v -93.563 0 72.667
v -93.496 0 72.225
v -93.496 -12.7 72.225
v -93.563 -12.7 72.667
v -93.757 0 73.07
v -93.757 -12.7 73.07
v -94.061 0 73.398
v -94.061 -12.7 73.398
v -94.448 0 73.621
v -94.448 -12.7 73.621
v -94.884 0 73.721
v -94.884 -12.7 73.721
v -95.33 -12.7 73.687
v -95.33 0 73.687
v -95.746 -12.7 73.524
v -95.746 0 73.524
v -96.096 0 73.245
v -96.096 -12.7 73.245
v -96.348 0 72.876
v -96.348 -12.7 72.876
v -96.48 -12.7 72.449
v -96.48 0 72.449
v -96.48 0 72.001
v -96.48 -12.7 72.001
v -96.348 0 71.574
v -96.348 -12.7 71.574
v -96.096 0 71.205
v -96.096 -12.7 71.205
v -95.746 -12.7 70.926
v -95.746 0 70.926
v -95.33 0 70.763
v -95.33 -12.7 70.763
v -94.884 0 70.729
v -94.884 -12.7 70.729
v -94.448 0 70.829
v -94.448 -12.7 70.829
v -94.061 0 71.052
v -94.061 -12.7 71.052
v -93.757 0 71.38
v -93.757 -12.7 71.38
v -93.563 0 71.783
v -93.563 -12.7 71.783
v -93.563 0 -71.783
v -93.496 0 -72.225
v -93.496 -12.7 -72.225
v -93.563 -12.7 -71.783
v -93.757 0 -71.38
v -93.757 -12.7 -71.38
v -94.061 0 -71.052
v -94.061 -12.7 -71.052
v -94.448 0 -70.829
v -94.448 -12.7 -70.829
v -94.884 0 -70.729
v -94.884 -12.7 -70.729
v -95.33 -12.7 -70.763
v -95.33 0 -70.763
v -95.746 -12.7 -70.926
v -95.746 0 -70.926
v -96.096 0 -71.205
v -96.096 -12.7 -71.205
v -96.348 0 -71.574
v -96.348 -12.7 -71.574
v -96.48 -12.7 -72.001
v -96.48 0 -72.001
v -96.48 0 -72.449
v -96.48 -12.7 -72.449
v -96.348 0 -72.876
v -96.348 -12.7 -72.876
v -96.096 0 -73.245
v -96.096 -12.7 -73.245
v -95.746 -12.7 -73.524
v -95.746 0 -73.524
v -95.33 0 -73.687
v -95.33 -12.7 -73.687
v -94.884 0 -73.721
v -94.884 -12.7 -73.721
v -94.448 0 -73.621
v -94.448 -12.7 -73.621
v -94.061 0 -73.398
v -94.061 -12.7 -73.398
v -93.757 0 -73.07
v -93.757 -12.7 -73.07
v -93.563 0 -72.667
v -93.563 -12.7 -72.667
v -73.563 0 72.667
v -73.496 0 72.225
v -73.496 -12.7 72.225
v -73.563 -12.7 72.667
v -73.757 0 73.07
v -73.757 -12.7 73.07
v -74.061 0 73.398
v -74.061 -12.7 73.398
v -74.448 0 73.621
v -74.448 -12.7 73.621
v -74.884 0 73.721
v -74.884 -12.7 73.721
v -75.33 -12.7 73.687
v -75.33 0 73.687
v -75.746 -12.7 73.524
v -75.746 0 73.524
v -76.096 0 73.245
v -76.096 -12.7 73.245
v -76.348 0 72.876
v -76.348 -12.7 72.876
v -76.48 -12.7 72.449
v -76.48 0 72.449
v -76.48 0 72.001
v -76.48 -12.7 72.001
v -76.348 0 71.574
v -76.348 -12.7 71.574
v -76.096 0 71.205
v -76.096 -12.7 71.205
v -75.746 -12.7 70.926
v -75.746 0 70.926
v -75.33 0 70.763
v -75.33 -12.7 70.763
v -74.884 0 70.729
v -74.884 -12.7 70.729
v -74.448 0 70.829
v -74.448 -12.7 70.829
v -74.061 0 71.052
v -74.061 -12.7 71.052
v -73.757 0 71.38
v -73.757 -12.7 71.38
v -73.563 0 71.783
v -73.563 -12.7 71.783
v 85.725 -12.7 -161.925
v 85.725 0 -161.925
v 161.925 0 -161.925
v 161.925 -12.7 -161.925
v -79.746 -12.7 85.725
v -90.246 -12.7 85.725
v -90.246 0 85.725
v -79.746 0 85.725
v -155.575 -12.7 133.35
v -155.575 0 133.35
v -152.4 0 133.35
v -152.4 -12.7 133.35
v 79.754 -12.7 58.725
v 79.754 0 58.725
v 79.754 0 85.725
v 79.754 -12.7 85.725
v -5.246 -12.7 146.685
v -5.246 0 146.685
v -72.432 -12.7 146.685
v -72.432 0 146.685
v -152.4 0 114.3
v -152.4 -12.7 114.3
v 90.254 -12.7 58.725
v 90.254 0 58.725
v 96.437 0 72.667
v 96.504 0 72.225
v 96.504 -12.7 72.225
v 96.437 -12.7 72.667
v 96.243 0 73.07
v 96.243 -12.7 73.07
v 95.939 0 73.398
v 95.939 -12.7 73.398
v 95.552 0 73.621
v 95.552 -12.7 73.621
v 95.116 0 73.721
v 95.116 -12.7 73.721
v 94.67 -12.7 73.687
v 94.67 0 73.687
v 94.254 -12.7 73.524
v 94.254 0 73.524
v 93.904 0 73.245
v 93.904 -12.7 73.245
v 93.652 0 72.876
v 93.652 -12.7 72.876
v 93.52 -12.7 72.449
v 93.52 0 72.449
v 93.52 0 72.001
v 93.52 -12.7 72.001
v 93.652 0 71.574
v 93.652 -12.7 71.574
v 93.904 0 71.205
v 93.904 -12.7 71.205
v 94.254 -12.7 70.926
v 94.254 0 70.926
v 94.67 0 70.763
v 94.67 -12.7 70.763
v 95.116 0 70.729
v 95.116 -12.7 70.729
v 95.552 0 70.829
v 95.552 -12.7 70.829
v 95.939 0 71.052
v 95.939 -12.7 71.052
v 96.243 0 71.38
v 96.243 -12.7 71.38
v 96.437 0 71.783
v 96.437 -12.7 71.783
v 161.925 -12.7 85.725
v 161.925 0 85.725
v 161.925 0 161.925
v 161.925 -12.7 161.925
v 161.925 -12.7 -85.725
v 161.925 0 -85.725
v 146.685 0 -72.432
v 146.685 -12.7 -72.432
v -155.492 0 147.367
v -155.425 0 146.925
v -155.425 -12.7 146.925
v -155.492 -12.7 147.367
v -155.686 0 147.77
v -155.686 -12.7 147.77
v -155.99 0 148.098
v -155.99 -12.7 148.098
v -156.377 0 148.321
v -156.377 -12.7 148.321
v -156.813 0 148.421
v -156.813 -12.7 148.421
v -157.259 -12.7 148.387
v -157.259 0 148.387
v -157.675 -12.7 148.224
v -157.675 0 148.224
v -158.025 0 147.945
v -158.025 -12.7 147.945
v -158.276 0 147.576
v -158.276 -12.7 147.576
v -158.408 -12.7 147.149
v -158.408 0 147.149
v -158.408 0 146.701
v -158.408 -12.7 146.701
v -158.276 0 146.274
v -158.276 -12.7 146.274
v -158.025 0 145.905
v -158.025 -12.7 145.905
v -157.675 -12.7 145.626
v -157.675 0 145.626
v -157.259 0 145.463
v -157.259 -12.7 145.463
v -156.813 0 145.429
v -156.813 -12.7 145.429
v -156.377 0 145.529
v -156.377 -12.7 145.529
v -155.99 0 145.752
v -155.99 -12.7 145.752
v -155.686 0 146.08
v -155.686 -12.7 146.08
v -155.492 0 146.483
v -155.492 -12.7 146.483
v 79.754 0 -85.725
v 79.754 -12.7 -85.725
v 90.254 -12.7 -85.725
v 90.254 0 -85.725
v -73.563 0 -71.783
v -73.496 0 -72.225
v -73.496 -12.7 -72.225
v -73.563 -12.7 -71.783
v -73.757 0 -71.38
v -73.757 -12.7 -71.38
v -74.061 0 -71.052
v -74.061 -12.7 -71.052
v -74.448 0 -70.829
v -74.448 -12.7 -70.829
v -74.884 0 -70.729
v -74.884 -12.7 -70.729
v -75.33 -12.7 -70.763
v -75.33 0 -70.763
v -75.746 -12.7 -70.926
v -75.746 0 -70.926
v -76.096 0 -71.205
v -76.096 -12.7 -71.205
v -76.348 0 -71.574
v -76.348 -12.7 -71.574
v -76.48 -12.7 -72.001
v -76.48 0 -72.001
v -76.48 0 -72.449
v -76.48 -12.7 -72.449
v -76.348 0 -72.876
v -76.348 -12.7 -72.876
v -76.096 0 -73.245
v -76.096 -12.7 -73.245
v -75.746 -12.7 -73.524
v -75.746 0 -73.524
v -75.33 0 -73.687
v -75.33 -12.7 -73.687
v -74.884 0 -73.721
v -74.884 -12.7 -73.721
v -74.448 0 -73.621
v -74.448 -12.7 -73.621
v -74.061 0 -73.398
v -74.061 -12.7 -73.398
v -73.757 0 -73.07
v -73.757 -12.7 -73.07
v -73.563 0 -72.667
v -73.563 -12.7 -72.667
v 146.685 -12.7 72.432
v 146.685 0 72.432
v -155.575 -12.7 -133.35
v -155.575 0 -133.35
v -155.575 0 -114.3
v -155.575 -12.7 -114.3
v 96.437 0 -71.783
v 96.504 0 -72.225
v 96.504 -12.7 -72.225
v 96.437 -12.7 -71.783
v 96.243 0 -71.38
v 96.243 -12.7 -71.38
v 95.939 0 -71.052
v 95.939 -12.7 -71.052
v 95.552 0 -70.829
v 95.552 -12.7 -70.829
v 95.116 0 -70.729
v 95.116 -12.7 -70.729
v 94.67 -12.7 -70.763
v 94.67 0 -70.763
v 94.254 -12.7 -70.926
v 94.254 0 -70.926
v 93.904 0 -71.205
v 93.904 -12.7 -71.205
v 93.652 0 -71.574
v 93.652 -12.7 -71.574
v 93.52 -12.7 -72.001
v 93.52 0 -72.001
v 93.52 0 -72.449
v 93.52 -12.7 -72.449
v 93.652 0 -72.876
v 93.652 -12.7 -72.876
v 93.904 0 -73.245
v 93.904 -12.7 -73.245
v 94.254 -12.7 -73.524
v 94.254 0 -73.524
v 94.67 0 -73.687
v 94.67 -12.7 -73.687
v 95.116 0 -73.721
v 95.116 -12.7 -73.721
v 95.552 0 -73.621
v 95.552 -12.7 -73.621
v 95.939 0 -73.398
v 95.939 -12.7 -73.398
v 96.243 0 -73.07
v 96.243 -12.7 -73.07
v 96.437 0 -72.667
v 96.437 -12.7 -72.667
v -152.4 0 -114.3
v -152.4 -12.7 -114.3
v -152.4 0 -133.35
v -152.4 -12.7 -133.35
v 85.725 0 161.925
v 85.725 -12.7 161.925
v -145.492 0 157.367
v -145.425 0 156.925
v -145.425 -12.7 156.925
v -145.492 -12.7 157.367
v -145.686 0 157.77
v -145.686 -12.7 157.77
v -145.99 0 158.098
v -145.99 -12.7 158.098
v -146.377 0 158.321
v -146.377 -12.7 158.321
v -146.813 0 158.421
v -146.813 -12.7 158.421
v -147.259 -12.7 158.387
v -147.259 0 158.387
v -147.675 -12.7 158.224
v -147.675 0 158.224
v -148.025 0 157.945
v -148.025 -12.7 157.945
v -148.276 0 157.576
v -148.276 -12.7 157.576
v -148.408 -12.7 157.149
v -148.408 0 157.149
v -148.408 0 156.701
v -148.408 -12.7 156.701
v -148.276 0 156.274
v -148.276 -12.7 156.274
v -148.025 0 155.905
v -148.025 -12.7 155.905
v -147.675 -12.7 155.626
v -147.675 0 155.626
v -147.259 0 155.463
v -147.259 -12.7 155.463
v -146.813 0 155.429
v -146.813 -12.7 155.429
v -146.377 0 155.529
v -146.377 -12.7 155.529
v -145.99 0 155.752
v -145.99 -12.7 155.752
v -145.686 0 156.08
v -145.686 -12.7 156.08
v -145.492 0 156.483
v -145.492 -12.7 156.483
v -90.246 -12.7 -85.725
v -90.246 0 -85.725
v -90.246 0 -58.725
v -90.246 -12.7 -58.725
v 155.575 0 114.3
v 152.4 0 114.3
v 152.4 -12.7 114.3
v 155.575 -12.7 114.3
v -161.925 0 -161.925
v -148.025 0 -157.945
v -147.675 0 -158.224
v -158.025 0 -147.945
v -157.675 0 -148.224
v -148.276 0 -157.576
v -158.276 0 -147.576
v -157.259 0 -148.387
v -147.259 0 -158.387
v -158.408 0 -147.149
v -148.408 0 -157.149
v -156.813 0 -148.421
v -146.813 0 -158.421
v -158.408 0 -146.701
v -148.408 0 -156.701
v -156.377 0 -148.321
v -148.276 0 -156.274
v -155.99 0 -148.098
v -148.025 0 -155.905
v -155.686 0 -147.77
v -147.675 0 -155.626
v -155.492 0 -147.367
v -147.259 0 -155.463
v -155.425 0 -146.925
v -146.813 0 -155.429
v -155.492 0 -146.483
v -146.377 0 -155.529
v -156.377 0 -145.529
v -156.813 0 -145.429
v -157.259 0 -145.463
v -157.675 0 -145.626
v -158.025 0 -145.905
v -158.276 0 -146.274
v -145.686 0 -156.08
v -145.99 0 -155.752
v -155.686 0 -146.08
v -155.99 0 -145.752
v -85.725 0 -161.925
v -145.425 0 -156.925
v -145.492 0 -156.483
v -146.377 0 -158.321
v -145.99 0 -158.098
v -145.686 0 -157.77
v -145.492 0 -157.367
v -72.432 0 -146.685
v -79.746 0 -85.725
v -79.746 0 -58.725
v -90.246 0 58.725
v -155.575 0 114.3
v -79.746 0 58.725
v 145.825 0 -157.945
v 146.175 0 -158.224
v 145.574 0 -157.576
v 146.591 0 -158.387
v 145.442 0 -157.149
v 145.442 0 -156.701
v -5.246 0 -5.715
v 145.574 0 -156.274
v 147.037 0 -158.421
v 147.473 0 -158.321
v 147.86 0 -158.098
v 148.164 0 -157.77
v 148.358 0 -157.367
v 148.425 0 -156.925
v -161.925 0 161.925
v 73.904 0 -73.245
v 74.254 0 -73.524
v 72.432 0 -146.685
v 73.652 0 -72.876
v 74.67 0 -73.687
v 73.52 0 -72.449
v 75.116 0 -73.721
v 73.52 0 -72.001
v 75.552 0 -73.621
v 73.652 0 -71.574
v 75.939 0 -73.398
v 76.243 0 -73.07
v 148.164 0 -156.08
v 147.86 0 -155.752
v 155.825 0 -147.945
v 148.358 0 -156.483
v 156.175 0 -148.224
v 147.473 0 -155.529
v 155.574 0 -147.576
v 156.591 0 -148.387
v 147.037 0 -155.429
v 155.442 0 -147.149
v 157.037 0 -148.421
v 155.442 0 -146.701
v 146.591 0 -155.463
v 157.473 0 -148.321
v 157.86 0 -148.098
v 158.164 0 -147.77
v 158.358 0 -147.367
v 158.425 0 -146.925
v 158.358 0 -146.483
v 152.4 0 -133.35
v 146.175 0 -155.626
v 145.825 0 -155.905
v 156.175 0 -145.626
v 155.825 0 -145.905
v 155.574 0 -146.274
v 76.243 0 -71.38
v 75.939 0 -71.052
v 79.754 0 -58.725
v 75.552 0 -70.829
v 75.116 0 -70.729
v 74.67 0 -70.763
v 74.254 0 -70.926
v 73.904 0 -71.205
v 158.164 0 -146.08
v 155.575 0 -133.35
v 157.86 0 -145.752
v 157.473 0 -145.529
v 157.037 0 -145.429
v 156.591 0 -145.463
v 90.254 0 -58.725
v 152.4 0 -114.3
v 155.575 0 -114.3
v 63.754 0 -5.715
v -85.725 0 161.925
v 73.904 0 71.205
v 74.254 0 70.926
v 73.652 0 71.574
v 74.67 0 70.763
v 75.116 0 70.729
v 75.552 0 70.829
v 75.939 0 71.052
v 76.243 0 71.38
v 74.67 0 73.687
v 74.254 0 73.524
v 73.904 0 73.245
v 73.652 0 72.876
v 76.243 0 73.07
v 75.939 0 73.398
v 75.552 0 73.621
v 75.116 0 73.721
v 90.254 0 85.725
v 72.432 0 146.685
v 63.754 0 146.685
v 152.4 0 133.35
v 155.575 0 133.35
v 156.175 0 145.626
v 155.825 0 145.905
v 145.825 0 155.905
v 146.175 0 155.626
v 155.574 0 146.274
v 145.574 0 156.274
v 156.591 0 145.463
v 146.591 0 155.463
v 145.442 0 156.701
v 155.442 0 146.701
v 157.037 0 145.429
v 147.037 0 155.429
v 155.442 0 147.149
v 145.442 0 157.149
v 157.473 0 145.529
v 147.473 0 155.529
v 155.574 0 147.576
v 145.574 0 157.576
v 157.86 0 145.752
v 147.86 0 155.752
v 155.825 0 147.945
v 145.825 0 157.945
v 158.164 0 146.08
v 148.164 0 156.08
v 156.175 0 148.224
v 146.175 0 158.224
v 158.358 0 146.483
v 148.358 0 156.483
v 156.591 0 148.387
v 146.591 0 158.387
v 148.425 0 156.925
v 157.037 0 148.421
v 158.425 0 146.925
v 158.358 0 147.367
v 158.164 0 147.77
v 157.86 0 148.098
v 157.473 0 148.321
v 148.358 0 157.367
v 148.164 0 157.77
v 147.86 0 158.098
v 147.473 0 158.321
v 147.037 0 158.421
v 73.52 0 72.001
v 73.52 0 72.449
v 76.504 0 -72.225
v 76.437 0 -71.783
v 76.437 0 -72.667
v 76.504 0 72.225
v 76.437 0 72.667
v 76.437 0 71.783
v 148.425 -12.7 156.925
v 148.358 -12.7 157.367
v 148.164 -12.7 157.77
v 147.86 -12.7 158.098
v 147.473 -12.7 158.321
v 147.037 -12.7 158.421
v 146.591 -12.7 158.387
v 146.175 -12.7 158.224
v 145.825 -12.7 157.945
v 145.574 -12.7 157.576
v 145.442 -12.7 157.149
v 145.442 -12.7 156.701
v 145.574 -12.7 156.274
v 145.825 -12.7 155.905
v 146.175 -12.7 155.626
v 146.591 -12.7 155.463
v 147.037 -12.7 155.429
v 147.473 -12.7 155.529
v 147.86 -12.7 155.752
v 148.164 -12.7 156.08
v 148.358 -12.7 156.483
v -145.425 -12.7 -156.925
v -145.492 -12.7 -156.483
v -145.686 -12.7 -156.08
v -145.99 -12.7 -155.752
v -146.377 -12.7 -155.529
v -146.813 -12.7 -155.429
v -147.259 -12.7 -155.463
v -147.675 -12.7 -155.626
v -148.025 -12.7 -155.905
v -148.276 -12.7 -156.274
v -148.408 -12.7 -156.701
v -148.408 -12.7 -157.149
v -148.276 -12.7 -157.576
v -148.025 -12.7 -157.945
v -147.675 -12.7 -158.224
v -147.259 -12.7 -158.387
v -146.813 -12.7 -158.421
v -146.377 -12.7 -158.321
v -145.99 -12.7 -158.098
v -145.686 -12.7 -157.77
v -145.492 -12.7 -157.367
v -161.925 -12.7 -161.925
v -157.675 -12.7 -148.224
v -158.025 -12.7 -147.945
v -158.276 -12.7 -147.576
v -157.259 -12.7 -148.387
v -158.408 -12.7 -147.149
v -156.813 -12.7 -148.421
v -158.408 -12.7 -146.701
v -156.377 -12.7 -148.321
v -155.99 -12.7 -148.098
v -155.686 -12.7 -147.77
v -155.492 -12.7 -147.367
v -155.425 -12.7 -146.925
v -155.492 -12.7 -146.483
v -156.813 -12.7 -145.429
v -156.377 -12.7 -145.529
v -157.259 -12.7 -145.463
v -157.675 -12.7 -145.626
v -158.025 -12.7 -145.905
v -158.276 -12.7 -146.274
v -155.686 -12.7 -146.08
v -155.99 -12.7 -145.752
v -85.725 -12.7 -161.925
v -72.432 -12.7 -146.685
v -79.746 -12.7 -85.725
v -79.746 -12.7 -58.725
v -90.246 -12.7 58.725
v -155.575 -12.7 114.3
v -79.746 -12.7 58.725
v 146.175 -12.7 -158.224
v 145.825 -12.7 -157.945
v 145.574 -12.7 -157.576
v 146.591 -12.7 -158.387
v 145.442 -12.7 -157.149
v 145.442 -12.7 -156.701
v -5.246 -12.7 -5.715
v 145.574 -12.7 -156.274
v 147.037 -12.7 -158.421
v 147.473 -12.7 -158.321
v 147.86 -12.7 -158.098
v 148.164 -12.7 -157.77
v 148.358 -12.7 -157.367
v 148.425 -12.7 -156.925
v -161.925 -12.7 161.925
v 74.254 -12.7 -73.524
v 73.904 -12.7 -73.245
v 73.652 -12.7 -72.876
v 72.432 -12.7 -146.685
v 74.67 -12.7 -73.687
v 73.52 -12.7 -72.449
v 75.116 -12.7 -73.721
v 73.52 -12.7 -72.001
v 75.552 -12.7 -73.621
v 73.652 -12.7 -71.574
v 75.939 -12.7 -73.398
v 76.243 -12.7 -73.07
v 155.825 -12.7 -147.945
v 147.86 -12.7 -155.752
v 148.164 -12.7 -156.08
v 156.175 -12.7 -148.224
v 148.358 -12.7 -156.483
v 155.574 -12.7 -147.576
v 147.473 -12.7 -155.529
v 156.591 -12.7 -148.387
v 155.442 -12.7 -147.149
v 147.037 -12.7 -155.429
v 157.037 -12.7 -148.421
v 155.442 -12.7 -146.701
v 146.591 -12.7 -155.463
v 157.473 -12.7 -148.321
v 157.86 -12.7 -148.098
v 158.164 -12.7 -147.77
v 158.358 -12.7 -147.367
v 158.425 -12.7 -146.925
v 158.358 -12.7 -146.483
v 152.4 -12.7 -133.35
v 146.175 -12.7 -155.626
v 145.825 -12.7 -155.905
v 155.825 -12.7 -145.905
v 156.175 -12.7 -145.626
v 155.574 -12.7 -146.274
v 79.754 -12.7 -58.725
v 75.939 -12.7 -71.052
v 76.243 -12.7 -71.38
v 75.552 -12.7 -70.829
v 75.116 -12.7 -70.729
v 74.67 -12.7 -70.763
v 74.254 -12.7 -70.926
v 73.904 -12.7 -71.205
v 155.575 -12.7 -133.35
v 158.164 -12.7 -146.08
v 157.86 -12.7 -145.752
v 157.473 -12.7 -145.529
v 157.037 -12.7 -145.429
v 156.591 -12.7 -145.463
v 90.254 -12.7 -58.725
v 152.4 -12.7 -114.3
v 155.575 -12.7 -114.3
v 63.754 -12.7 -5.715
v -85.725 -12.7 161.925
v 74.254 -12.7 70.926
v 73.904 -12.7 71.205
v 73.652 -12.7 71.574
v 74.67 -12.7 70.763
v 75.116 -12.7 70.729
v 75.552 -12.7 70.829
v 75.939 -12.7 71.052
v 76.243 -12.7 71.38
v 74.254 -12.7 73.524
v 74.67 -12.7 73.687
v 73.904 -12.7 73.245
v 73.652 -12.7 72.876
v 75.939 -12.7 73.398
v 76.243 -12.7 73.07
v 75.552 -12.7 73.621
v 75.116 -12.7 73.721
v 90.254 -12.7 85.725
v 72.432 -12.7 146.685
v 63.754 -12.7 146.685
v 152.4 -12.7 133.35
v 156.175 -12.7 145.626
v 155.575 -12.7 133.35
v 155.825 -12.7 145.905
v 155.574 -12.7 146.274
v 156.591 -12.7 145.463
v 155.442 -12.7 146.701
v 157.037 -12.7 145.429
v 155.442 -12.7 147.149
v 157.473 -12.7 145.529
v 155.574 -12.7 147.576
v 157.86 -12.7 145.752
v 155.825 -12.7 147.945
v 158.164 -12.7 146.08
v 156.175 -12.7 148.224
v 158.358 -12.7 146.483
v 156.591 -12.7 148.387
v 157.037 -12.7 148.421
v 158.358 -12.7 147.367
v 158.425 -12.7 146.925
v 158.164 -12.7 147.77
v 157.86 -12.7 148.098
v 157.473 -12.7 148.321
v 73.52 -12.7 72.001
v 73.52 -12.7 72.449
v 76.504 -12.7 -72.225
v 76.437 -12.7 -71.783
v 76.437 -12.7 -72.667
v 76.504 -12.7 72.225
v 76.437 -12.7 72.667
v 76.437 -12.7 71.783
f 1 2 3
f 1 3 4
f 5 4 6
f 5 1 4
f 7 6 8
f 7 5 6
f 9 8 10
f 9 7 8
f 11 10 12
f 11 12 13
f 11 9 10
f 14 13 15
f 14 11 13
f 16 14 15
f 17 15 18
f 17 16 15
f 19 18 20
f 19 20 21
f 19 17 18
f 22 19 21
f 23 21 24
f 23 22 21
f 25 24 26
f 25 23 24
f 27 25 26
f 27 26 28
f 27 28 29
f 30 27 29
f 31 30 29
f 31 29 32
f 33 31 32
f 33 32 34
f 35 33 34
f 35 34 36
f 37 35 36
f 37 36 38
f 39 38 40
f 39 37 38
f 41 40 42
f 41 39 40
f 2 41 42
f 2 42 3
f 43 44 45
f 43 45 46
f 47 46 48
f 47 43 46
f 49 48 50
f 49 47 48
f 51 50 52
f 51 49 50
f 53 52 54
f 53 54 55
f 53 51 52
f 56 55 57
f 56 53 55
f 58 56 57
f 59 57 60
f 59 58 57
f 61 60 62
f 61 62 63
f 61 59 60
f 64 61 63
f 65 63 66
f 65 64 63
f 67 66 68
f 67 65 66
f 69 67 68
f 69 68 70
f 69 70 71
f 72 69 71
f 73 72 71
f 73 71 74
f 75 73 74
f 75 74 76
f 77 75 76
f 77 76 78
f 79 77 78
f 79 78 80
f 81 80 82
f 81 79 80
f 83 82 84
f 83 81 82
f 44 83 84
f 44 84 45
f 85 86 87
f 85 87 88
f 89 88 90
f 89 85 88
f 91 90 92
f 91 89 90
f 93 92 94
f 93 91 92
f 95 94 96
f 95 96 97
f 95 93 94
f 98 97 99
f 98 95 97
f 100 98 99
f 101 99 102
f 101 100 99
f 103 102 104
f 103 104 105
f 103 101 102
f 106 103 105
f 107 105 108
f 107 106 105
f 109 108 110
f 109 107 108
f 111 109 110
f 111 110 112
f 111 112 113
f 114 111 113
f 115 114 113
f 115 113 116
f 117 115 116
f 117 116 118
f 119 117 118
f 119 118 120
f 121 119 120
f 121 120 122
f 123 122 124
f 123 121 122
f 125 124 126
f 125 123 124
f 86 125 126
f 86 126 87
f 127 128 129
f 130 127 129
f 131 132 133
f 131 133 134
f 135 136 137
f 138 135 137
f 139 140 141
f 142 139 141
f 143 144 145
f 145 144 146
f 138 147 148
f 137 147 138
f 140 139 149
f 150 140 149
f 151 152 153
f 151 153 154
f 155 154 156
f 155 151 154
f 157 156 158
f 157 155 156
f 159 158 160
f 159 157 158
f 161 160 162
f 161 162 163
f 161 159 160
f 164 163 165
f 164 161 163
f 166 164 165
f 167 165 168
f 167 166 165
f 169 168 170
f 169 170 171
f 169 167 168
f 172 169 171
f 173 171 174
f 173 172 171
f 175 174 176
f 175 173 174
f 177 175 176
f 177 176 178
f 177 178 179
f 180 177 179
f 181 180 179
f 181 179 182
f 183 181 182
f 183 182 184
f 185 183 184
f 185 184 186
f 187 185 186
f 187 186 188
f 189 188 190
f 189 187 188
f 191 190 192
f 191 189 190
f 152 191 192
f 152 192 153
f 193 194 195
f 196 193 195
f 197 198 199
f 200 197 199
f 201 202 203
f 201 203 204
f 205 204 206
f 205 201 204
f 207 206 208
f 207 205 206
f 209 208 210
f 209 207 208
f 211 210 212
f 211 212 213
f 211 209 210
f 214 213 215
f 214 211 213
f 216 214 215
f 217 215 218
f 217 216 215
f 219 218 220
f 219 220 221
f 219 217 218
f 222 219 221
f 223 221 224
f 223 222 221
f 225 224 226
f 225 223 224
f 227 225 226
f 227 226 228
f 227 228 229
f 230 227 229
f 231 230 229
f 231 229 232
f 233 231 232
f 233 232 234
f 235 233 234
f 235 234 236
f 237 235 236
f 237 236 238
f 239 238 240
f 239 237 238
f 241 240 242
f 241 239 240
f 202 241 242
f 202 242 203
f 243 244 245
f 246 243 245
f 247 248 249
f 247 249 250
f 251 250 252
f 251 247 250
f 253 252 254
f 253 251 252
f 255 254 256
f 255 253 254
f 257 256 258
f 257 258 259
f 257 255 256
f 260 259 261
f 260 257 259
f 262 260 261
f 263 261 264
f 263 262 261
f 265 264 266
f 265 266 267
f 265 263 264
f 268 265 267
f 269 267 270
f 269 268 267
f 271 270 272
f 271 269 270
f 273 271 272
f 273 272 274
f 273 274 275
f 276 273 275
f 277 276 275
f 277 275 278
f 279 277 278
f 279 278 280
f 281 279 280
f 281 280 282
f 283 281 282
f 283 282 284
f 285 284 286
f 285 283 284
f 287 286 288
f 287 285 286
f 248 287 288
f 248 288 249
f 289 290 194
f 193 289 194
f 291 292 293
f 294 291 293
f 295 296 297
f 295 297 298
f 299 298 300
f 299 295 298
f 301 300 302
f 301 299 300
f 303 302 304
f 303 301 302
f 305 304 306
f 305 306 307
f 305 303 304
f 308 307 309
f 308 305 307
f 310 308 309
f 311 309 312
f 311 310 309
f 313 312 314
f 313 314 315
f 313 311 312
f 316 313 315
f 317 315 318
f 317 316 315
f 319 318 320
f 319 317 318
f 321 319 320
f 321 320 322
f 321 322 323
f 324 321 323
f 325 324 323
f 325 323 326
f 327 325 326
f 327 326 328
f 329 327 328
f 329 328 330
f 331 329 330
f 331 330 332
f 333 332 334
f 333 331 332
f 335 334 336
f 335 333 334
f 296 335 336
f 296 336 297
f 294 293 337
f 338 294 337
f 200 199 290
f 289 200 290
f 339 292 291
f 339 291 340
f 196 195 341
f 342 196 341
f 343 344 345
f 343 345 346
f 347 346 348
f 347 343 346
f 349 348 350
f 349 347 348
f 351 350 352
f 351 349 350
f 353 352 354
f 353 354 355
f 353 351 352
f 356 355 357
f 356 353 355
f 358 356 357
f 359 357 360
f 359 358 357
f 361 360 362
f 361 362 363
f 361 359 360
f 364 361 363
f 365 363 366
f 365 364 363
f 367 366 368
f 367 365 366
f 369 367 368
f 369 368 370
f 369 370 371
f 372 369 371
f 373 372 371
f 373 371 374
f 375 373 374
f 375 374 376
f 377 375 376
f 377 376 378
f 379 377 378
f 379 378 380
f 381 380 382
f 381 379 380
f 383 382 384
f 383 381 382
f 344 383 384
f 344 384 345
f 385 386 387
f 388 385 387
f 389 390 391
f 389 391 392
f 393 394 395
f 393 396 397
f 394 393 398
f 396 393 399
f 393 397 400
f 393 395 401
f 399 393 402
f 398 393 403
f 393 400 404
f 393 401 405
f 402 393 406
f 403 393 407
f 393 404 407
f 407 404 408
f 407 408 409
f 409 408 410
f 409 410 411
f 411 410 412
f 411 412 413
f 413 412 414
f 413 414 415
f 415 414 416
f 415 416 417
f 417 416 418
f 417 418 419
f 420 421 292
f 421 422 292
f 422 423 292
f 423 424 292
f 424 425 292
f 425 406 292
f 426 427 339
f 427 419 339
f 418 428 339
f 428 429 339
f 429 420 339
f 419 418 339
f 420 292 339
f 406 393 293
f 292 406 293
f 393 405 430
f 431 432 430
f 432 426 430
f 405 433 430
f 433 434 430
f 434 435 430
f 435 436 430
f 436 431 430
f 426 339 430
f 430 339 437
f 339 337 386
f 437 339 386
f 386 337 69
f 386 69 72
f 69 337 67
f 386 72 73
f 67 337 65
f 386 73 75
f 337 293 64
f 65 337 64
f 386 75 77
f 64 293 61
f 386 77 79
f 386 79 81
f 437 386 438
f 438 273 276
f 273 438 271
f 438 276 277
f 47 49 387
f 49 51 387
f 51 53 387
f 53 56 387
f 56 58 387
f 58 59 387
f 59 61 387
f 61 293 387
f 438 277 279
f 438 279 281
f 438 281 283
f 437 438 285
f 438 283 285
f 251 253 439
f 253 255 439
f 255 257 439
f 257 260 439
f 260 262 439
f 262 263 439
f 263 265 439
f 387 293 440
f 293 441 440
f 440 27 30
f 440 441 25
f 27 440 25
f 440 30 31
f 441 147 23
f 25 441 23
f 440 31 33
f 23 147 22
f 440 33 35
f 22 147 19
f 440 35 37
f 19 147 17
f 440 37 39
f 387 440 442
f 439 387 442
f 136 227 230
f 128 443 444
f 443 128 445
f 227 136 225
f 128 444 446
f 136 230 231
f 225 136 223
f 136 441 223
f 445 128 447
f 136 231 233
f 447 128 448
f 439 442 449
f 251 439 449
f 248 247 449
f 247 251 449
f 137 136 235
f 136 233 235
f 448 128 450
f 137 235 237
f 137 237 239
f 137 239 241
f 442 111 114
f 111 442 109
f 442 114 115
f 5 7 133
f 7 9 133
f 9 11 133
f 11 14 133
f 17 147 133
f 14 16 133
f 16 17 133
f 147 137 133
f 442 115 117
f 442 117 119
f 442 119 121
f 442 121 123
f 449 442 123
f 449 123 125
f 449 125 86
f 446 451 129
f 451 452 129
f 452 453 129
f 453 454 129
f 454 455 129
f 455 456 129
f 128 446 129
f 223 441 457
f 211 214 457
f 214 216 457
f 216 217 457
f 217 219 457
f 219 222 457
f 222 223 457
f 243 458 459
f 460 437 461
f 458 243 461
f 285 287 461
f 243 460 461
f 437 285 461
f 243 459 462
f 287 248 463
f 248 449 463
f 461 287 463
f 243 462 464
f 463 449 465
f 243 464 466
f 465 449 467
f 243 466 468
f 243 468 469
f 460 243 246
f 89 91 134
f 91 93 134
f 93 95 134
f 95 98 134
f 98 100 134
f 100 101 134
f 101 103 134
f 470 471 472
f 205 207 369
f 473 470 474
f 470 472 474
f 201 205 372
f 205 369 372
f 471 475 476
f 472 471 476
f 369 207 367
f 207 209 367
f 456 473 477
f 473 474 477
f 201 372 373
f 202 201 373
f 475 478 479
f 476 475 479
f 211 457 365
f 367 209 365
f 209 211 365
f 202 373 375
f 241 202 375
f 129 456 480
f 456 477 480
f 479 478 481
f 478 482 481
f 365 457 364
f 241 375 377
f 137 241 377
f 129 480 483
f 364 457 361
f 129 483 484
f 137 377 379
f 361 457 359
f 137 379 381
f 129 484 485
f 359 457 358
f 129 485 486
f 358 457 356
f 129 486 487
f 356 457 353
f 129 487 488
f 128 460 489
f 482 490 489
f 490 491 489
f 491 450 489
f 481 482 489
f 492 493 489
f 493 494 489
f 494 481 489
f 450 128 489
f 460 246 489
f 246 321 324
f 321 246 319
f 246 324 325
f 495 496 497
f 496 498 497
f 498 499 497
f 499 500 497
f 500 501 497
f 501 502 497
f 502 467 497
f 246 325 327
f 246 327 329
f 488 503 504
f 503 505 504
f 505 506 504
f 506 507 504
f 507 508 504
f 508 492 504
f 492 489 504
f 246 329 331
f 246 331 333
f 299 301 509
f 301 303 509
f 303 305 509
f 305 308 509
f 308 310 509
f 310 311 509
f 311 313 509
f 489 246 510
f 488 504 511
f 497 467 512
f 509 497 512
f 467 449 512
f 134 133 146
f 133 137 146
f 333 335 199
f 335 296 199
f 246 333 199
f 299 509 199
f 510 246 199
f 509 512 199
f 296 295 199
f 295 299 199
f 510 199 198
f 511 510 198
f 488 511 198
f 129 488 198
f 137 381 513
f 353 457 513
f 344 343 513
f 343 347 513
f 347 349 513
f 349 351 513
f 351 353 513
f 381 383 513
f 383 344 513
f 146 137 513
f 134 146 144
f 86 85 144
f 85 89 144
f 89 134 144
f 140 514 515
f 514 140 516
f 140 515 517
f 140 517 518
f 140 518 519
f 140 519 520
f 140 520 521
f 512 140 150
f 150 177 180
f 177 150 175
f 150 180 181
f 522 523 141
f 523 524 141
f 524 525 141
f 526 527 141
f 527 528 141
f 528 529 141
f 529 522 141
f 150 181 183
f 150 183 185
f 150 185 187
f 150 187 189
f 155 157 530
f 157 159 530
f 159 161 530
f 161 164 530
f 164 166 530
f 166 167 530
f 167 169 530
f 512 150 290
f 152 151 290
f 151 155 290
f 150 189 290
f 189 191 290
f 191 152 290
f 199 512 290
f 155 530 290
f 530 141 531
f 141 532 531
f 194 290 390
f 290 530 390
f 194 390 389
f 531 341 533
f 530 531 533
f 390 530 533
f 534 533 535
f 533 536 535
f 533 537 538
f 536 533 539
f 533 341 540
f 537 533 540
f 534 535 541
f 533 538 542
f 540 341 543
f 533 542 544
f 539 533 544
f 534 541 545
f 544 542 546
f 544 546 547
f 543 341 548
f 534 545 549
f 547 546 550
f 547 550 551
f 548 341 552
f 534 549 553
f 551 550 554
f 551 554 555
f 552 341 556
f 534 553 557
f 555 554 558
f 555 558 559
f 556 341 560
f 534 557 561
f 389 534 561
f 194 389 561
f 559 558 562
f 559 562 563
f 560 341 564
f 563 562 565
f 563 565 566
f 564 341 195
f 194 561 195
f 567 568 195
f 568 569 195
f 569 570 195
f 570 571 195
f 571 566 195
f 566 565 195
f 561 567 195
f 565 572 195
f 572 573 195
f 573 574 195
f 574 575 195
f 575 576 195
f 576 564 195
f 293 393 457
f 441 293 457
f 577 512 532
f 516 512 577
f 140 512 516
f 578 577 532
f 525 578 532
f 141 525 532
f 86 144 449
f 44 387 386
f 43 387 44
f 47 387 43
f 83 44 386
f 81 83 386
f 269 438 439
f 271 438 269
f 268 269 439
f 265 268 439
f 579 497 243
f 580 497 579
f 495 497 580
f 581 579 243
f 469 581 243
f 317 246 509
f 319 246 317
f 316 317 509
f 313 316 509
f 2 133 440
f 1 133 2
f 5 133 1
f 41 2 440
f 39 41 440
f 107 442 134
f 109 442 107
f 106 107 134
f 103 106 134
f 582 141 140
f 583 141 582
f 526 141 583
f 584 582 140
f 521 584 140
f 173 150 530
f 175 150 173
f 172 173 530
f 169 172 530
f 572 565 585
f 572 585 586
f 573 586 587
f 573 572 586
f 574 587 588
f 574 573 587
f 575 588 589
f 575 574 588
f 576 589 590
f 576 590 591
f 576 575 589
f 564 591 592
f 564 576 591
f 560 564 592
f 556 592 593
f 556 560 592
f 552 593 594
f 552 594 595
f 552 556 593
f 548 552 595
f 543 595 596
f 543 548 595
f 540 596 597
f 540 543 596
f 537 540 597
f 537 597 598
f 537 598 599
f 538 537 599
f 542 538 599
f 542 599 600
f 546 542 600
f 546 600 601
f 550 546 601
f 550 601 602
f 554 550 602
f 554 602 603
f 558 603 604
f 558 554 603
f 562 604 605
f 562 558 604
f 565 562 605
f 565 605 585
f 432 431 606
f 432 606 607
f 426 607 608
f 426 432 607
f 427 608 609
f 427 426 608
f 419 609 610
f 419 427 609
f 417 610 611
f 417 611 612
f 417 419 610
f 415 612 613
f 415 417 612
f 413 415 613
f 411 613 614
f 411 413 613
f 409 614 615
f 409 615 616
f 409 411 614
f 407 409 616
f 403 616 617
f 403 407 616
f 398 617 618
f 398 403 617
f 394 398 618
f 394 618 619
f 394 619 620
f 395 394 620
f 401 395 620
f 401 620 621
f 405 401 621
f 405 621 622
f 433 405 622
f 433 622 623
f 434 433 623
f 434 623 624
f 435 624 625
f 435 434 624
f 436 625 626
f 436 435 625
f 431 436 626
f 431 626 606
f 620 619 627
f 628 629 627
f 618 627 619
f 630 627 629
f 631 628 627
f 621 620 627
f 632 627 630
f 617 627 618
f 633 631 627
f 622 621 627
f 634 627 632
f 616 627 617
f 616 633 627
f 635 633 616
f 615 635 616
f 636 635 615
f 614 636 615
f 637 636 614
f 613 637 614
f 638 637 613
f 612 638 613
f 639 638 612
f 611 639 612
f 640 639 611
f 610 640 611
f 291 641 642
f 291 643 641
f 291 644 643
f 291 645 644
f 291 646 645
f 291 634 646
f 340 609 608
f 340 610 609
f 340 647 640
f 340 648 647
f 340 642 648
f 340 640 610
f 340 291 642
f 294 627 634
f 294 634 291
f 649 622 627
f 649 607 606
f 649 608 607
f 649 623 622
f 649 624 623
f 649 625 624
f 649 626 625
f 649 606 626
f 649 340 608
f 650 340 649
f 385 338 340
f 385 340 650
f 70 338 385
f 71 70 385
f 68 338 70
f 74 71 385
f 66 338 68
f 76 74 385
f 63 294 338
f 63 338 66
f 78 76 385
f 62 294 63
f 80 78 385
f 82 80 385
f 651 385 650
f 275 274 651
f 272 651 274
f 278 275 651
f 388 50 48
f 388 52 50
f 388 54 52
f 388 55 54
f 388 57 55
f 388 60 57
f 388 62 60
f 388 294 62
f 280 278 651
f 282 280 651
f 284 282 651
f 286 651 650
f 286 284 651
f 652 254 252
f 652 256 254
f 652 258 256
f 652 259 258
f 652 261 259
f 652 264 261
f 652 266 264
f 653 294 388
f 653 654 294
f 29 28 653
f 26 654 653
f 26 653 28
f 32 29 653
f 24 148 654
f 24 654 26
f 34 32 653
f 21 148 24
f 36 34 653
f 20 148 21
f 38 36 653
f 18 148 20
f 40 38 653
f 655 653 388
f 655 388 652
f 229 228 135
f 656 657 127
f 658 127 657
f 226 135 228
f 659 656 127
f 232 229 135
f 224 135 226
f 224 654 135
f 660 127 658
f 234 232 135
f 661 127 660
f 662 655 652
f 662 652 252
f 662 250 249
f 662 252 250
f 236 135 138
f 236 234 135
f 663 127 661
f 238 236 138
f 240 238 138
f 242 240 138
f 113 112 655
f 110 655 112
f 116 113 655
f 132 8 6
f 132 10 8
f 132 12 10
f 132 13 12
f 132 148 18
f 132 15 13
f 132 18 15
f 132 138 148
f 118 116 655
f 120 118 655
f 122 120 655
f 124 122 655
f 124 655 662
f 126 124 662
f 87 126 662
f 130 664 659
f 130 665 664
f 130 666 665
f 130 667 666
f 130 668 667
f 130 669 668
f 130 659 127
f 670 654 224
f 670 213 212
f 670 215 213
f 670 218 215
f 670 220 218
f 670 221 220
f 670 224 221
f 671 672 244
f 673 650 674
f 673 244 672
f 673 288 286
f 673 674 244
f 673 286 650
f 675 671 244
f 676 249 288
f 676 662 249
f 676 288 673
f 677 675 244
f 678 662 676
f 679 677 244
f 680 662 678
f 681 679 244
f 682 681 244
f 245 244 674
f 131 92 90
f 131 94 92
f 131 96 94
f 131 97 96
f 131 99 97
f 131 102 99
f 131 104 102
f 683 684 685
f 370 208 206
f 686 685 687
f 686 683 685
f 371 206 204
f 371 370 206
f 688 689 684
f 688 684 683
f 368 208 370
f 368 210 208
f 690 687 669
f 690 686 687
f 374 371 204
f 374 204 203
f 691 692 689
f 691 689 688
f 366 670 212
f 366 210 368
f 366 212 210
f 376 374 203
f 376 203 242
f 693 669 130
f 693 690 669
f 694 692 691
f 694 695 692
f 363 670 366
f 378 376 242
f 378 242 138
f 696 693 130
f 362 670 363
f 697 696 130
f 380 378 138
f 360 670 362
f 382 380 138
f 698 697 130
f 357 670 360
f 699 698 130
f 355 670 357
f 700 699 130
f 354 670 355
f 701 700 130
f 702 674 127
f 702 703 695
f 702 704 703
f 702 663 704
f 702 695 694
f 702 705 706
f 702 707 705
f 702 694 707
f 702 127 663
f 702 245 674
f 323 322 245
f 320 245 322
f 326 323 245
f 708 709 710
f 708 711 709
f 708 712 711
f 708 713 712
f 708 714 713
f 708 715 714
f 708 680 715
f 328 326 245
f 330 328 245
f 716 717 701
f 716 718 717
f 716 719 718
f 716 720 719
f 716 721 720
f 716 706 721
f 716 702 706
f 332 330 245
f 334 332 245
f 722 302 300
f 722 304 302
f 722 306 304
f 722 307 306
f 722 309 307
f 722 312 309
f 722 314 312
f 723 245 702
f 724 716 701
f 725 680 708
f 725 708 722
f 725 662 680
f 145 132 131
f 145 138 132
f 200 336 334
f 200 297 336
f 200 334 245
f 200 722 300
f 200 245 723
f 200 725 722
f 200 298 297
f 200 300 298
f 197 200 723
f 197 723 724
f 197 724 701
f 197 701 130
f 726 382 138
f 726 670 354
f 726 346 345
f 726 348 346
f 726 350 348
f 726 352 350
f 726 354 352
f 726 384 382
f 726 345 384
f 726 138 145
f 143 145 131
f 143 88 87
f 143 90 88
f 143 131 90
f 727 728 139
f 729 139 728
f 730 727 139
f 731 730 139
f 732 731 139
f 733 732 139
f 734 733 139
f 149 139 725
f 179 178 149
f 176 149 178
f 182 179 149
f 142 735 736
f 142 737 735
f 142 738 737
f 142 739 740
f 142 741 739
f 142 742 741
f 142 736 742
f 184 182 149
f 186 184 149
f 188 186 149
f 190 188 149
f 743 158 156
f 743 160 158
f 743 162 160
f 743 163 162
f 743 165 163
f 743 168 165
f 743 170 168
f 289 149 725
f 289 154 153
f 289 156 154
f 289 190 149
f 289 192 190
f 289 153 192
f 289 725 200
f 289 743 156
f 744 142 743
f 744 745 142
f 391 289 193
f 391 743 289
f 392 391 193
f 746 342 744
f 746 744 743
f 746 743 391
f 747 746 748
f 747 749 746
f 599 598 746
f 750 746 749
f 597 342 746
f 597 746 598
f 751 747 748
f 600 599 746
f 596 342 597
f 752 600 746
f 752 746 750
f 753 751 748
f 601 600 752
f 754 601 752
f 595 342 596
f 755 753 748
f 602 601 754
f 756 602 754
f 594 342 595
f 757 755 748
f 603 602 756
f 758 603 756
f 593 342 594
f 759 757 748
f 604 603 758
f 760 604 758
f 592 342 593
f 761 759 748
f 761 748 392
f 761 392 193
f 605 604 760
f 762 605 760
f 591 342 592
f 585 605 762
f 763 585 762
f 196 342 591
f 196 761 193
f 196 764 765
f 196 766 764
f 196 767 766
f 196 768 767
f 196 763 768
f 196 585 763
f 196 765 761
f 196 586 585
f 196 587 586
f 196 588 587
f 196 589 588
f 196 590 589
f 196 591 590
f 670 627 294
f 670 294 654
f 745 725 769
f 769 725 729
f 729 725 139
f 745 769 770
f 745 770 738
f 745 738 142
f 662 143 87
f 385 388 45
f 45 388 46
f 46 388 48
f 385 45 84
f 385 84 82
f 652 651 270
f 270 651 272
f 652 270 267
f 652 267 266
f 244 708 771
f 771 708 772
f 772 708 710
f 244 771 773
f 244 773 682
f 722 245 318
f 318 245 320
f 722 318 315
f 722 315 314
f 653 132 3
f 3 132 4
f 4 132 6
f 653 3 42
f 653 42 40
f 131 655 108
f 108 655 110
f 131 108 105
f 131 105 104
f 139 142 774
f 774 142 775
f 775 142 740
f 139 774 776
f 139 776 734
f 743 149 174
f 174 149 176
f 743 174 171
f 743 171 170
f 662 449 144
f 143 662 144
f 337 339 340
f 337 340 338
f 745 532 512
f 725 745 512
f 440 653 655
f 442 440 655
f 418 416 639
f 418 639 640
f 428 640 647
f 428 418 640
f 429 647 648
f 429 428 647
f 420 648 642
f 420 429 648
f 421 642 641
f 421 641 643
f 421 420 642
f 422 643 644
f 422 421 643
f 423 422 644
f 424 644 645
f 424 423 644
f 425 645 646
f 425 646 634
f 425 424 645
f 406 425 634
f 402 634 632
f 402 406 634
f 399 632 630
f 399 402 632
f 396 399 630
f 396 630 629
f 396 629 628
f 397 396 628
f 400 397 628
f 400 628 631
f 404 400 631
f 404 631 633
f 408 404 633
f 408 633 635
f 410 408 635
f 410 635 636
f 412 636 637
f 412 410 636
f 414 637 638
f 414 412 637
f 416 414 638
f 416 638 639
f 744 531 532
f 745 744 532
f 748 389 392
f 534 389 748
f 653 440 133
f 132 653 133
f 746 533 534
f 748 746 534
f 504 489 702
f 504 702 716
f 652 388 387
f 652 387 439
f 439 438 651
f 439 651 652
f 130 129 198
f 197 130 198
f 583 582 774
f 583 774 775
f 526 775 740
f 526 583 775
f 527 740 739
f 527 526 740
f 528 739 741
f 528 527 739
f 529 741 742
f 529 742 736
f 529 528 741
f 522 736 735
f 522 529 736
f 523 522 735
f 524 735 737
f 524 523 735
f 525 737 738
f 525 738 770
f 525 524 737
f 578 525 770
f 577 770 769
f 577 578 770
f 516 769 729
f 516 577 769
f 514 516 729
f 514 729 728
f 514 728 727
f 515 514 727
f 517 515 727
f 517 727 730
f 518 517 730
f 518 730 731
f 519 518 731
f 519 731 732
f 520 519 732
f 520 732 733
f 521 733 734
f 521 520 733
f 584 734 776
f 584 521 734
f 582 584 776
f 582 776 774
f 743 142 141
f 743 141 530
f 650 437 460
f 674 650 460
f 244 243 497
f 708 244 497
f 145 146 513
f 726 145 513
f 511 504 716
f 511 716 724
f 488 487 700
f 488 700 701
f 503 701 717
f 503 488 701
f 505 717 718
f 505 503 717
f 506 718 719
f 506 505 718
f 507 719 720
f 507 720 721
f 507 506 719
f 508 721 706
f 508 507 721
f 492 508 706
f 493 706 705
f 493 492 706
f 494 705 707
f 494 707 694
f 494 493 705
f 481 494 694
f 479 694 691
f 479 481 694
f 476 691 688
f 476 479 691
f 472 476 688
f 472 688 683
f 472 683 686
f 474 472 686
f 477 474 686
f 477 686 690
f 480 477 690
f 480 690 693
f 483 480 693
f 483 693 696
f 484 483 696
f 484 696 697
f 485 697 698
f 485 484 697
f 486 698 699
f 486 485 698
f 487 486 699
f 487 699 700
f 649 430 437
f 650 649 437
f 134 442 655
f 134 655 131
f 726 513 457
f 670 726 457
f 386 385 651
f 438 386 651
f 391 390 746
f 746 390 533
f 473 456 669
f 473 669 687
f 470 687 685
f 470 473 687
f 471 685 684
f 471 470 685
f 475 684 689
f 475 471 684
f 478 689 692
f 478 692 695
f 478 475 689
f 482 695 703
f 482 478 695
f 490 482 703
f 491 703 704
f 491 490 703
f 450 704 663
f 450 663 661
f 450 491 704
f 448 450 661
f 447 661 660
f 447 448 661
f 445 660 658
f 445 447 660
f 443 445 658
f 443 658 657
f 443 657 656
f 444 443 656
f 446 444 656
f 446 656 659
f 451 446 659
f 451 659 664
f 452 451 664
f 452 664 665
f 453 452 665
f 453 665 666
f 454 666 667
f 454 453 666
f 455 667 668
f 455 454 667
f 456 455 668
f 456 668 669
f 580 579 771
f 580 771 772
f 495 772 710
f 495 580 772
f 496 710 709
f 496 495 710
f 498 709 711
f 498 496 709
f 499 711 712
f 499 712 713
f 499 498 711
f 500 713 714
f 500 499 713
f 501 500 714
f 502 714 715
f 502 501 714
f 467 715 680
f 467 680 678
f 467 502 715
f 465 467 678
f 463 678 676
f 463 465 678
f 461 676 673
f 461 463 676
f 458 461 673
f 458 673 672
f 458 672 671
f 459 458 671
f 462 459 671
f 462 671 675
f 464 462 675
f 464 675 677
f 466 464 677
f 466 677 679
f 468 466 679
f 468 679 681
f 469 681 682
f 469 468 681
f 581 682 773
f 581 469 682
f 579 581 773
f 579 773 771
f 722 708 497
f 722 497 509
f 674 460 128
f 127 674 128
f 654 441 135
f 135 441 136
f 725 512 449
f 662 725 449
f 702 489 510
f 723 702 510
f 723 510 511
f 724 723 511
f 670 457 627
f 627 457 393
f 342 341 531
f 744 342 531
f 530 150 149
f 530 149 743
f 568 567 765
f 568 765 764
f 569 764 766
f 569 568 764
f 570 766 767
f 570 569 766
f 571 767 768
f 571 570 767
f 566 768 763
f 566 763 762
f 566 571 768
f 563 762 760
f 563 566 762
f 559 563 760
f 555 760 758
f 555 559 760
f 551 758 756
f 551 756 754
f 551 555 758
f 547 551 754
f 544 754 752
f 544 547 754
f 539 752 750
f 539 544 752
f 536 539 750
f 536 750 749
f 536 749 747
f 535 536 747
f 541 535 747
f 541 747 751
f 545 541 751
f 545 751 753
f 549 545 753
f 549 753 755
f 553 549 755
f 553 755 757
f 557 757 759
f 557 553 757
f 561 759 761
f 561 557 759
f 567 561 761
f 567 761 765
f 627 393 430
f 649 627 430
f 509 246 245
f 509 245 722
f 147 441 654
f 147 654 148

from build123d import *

# Parameters (mm, degrees)
F0_R     = 1.5
F0_W     = 3.175
F0_H     = 19.05
F0_W_2   = 10.5
F0_H_2   = 27
F1_DEPTH = 12.7


with BuildPart() as f1:
    # F0 (on Front) → F1 (new body)
    with BuildSketch(Plane.XZ):
        Polygon((-85.725, 161.925), (-161.925, 161.925), (-161.925, 85.725), (-146.685, 72.43161), (-146.685, -72.43161), (-161.925, -85.725), (-161.925, -161.925), (-85.725, -161.925), (-72.43161, -146.685), (72.43161, -146.685), (85.725, -161.925), (161.925, -161.925), (161.925, -85.725), (146.685, -72.43161), (146.685, 72.43161), (161.925, 85.725), (161.925, 161.925), (85.725, 161.925), (72.43161, 146.685), (63.7538, 146.685), (63.7538, -5.715), (-5.2462, -5.715), (-5.2462, 146.685), (-72.43161, 146.685), align=None)
        with Locations((-146.925, -156.925)):
            Circle(F0_R, mode=Mode.SUBTRACT)
        with Locations((-156.925, -146.925)):
            Circle(F0_R, mode=Mode.SUBTRACT)
        with Locations((-153.9875, -123.825)):
            Rectangle(F0_W, F0_H, mode=Mode.SUBTRACT)
        with Locations((-94.9964, -72.225)):
            Circle(F0_R, mode=Mode.SUBTRACT)
        with Locations((-84.9962, -72.225)):
            Rectangle(F0_W_2, F0_H_2, mode=Mode.SUBTRACT)
        with Locations((-74.9964, -72.225)):
            Circle(F0_R, mode=Mode.SUBTRACT)
        with Locations((146.925, -156.925)):
            Circle(F0_R, mode=Mode.SUBTRACT)
        with Locations((156.925, -146.925)):
            Circle(F0_R, mode=Mode.SUBTRACT)
        with Locations((153.9875, -123.825)):
            Rectangle(F0_W, F0_H, mode=Mode.SUBTRACT)
        with Locations((75.0036, -72.225)):
            Circle(F0_R, mode=Mode.SUBTRACT)
        with Locations((85.0038, -72.225)):
            Rectangle(F0_W_2, F0_H_2, mode=Mode.SUBTRACT)
        with Locations((95.0036, -72.225)):
            Circle(F0_R, mode=Mode.SUBTRACT)
        with Locations((-94.9964, 72.225)):
            Circle(F0_R, mode=Mode.SUBTRACT)
        with Locations((-84.9962, 72.225)):
            Rectangle(F0_W_2, F0_H_2, mode=Mode.SUBTRACT)
        with Locations((-74.9964, 72.225)):
            Circle(F0_R, mode=Mode.SUBTRACT)
        with Locations((-153.9875, 123.825)):
            Rectangle(F0_W, F0_H, mode=Mode.SUBTRACT)
        with Locations((-156.925, 146.925)):
            Circle(F0_R, mode=Mode.SUBTRACT)
        with Locations((-146.925, 156.925)):
            Circle(F0_R, mode=Mode.SUBTRACT)
        with Locations((75.0036, 72.225)):
            Circle(F0_R, mode=Mode.SUBTRACT)
        with Locations((85.0038, 72.225)):
            Rectangle(F0_W_2, F0_H_2, mode=Mode.SUBTRACT)
        with Locations((95.0036, 72.225)):
            Circle(F0_R, mode=Mode.SUBTRACT)
        with Locations((153.9875, 123.825)):
            Rectangle(F0_W, F0_H, mode=Mode.SUBTRACT)
        with Locations((156.925, 146.925)):
            Circle(F0_R, mode=Mode.SUBTRACT)
        with Locations((146.925, 156.925)):
            Circle(F0_R, mode=Mode.SUBTRACT)
        Polygon((-146.685, 72.43161), (-161.925, 85.725), (-161.925, -85.725), (-146.685, -72.43161), align=None)
    extrude(amount=F1_DEPTH)


solid = f1.part
